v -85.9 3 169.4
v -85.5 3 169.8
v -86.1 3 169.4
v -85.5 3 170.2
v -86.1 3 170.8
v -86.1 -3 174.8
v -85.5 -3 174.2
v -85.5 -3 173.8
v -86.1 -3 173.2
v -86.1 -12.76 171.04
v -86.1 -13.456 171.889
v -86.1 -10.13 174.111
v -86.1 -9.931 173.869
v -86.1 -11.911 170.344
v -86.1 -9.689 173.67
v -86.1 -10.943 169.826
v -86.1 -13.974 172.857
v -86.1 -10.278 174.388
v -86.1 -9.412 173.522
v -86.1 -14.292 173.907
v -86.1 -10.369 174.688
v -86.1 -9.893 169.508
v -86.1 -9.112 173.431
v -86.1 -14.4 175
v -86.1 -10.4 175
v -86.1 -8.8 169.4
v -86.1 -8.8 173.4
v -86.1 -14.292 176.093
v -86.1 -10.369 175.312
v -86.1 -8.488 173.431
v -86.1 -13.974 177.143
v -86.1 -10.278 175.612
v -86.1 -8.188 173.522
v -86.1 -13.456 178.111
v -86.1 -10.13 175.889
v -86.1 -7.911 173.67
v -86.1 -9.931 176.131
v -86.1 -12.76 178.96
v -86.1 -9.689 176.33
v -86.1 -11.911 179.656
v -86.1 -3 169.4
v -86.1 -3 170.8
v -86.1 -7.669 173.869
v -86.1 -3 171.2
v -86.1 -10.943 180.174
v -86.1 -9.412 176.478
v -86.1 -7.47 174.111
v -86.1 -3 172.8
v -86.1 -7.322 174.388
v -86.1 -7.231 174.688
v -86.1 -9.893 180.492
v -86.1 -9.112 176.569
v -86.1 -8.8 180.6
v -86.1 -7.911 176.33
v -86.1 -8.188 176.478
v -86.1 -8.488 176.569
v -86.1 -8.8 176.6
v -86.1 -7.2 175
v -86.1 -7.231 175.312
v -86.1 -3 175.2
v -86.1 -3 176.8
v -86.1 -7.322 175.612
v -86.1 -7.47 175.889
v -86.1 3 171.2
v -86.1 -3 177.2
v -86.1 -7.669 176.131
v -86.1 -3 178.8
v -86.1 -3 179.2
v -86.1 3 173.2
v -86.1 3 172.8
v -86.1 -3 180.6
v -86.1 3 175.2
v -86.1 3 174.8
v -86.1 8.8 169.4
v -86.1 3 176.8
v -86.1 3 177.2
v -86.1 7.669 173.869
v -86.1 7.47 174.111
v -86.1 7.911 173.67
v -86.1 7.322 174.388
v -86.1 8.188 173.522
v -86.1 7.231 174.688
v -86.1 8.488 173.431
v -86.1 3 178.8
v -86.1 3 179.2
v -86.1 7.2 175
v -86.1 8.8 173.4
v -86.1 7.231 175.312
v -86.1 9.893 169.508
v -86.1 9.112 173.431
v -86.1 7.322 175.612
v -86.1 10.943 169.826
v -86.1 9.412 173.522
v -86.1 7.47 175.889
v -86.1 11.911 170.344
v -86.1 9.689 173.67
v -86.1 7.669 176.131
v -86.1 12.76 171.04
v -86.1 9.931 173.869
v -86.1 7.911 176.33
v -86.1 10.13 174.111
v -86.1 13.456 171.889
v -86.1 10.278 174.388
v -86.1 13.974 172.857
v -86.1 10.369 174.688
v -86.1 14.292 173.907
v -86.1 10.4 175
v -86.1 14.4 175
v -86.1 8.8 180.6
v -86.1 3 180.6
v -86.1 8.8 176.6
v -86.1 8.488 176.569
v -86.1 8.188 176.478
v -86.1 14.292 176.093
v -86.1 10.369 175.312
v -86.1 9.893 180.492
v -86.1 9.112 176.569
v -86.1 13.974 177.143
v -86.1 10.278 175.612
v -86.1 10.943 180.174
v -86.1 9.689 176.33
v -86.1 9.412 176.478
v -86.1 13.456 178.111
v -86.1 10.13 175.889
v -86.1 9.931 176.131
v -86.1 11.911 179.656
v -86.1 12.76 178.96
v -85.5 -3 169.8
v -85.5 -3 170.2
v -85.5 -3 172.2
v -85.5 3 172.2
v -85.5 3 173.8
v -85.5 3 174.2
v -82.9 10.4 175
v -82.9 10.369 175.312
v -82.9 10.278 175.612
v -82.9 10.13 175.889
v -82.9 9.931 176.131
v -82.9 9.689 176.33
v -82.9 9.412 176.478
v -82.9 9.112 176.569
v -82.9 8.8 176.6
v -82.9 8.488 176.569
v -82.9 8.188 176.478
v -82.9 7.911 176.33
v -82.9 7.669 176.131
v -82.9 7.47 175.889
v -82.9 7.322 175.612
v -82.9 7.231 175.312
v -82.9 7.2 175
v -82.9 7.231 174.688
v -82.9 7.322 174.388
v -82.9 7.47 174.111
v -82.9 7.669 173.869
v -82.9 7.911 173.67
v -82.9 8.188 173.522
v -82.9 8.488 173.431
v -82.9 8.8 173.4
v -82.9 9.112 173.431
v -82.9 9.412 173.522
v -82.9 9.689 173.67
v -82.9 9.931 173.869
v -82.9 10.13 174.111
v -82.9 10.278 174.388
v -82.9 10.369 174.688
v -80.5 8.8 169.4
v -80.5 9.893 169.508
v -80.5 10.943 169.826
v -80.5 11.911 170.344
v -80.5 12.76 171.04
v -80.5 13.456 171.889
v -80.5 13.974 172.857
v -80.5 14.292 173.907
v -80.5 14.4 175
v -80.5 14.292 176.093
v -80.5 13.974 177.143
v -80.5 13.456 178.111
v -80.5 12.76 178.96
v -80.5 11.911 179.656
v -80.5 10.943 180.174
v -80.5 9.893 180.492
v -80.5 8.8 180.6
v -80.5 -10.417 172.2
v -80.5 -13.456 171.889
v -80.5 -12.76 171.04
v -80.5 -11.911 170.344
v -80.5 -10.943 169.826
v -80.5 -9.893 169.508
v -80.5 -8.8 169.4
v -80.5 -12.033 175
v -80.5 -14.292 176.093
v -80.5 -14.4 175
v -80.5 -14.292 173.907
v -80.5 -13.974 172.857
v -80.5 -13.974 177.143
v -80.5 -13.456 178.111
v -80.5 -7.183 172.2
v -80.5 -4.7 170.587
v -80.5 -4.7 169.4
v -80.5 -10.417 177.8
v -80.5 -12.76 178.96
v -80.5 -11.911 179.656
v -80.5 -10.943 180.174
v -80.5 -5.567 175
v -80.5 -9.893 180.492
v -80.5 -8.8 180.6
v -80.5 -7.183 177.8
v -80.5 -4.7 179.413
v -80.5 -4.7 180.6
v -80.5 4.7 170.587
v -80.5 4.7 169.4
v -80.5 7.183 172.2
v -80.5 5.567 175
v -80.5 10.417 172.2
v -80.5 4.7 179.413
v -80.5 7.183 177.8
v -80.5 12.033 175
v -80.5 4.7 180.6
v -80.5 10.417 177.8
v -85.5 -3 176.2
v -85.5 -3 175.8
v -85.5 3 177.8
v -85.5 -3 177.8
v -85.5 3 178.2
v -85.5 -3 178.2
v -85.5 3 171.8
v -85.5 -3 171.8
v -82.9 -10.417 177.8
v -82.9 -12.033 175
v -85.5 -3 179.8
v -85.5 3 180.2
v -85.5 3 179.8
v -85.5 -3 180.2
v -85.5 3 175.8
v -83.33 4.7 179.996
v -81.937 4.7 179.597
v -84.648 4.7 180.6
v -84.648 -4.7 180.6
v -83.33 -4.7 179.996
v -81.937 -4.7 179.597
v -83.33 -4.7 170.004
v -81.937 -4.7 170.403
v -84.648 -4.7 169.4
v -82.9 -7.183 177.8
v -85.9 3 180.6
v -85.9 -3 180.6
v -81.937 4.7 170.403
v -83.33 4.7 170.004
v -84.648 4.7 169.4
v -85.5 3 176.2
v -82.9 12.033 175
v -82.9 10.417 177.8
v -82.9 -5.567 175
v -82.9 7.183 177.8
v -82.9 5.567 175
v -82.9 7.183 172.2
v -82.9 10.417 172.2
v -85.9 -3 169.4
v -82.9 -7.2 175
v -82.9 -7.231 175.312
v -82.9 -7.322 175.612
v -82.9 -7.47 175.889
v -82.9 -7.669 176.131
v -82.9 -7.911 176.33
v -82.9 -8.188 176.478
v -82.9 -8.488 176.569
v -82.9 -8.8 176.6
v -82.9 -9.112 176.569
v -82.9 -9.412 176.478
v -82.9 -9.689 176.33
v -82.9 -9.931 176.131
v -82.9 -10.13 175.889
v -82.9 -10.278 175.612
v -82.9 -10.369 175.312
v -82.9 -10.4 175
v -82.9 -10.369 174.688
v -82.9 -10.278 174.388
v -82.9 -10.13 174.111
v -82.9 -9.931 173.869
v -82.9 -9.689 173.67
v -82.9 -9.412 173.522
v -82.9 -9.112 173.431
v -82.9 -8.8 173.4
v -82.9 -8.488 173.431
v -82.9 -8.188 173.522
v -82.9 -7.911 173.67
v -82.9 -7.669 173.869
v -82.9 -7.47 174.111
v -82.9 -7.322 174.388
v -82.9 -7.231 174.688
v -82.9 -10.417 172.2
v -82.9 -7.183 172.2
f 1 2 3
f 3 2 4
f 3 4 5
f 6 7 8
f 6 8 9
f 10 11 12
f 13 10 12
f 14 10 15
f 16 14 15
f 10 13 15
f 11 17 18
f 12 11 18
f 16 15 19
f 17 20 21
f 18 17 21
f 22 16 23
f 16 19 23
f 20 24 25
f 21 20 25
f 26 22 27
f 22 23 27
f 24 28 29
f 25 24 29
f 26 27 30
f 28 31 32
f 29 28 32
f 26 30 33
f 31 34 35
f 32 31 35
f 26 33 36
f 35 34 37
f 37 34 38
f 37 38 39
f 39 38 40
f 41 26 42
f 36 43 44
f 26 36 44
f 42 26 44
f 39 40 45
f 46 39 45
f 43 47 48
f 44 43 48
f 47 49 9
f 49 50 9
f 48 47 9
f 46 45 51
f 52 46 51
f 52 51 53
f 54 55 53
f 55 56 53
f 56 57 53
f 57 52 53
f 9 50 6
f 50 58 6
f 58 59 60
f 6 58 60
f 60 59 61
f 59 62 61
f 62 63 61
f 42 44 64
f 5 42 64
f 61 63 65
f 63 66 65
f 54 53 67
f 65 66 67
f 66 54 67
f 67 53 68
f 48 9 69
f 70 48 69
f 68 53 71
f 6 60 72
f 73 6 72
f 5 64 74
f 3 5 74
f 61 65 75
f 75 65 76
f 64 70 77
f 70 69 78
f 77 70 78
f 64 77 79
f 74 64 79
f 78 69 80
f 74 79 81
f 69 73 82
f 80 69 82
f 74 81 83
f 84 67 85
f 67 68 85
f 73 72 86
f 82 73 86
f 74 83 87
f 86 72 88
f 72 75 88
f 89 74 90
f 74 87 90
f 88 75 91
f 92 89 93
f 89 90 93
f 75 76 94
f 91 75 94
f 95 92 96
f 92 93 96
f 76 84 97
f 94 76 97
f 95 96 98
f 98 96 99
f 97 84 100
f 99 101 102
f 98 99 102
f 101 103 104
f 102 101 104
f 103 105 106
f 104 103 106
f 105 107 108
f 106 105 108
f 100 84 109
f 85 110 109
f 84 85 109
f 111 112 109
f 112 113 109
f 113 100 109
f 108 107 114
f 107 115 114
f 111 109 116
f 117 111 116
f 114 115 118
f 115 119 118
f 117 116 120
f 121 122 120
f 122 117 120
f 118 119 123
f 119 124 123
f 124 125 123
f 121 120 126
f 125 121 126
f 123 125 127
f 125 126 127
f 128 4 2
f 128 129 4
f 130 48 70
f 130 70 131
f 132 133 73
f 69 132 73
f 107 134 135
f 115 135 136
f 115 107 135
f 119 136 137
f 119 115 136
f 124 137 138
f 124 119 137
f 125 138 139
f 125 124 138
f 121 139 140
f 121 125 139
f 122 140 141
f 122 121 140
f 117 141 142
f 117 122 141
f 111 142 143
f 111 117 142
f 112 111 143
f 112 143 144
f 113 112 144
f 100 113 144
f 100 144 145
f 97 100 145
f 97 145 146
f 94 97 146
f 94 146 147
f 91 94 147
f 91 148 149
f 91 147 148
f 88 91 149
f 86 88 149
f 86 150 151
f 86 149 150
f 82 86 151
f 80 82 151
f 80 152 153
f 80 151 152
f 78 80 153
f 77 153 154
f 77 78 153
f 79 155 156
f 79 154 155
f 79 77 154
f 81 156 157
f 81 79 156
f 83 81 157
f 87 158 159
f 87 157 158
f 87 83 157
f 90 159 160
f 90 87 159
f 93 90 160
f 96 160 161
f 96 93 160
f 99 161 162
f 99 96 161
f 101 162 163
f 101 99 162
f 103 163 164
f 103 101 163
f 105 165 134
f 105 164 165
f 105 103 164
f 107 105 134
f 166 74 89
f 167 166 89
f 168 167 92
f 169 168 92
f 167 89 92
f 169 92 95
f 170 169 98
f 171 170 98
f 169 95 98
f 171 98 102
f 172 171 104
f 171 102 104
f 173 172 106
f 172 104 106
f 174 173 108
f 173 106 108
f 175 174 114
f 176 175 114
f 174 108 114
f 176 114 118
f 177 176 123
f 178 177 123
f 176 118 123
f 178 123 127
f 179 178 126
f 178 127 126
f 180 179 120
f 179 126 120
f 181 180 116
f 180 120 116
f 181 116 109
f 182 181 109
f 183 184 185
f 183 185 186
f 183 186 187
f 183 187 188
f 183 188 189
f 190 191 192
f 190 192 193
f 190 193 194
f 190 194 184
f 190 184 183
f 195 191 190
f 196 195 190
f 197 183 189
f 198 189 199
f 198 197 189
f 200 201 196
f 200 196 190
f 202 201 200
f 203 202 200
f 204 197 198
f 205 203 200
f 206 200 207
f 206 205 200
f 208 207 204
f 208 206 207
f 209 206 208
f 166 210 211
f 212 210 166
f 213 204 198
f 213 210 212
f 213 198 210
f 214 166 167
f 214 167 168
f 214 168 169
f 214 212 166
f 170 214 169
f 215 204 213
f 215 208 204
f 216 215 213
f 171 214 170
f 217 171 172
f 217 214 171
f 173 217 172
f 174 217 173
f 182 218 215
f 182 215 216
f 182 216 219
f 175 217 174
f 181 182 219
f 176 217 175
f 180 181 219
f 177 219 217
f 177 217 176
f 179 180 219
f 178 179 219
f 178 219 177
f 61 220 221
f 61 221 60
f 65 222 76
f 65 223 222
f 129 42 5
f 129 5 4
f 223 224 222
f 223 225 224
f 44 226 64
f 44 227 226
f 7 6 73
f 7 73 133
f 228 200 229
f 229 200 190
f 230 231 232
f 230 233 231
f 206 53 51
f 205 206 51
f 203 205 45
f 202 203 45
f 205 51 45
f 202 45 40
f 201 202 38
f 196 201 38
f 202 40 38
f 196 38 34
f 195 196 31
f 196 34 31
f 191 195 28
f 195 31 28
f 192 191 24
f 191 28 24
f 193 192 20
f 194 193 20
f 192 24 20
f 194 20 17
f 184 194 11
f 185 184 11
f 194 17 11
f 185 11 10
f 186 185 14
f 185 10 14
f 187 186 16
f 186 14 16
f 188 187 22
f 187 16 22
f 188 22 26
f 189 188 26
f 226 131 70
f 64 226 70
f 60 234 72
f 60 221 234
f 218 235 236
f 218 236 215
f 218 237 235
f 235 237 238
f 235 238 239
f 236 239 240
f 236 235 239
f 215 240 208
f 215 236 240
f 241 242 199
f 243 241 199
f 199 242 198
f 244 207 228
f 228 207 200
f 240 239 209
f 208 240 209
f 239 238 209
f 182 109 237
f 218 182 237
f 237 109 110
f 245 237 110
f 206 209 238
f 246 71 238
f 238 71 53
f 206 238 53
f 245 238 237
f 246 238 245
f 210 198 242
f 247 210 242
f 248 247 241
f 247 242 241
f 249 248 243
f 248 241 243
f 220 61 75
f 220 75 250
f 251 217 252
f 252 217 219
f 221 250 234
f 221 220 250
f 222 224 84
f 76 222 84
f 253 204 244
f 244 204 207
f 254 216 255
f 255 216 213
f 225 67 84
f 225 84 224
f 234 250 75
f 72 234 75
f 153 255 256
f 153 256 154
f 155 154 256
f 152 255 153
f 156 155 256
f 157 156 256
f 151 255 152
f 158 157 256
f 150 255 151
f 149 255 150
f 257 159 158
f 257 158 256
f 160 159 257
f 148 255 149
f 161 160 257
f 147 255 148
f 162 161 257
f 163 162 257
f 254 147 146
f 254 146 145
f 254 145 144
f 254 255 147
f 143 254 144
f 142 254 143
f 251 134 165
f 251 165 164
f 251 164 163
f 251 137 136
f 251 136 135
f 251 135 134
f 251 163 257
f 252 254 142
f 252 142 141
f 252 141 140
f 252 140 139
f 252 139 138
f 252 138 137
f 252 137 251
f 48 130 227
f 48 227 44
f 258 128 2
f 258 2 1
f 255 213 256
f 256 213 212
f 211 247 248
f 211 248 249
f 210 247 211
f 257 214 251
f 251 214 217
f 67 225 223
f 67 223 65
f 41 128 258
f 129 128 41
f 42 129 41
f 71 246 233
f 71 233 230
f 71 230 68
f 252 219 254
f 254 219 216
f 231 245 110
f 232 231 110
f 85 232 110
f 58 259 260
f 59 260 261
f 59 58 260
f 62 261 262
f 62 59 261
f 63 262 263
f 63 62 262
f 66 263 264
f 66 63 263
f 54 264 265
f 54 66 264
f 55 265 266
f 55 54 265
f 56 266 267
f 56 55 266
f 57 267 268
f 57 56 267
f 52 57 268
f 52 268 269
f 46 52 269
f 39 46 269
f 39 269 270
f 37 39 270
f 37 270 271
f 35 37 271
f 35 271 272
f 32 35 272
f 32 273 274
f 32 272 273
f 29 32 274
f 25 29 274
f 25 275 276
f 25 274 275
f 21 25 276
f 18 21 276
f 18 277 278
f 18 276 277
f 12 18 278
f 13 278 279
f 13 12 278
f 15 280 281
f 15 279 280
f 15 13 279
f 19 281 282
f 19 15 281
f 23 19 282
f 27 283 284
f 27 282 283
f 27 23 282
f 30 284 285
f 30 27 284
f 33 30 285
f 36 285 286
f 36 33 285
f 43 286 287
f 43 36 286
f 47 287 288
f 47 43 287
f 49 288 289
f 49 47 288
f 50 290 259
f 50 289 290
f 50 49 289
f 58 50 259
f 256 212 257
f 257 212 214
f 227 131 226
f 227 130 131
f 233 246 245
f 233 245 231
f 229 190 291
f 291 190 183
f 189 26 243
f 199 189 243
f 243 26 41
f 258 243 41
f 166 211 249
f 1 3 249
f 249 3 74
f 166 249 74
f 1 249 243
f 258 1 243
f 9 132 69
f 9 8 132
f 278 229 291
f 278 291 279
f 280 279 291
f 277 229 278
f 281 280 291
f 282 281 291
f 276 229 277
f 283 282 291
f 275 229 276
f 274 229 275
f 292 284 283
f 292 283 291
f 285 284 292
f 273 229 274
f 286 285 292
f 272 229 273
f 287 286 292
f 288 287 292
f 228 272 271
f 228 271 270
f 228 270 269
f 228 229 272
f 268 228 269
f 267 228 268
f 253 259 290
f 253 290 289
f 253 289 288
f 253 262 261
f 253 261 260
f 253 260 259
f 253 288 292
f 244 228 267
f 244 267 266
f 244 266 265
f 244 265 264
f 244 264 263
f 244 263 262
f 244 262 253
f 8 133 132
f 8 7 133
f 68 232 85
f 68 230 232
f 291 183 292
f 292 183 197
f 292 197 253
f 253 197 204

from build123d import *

# Parameters (mm, degrees)
SKETCH019_R         = 1.6
PAD007_DEPTH        = 5.6
POCKET007_DEPTH     = 2.4
POCKET008_DEPTH     = 4.7
POCKET009_DEPTH     = 3
LINEARPATTERN_COUNT = 6
LINEARPATTERN_PITCH = 2


with BuildPart() as part:
    # Sketch019 (on Face6 of Binder001) → Pad007 (new body)
    with BuildSketch(Plane.YZ.offset(-86.1)):
        with BuildLine():
            Line((8.8, 180.6), (-8.8, 180.6))
            ThreePointArc((-8.8, 180.6), (-14.4, 175), (-8.8, 169.4))
            Line((-8.8, 169.4), (8.8, 169.4))
            ThreePointArc((8.8, 169.4), (14.4, 175), (8.8, 180.6))
        make_face()
        with Locations((-8.8, 175)):
            Circle(SKETCH019_R, mode=Mode.SUBTRACT)
        with Locations((8.8, 175)):
            Circle(SKETCH019_R, mode=Mode.SUBTRACT)
    extrude(amount=PAD007_DEPTH)

    # Sketch020 (on Face8 of Pad007) → Pocket007 (cut)
    with BuildSketch(Plane.YZ.offset(-80.5)):
        Polygon((-5.566838, 175), (-7.183419, 177.8), (-10.416581, 177.8), (-12.033162, 175), (-10.416581, 172.2), (-7.183419, 172.2), align=None)
        Polygon((5.566838, 175), (7.183419, 172.2), (10.416581, 172.2), (12.033162, 175), (10.416581, 177.8), (7.183419, 177.8), align=None)
    extrude(amount=-POCKET007_DEPTH, mode=Mode.SUBTRACT)

    # Sketch021 → Pocket008 (cut, symmetric)
    with BuildSketch(Plane.XZ):
        with BuildLine():
            ThreePointArc((-86.9, 182.325421), (-83.976243, 180.26218), (-80.5, 179.41303))
            Line((-80.5, 182.325421), (-80.5, 179.41303))
            Line((-86.9, 182.325421), (-80.5, 182.325421))
        make_face()
        with BuildLine():
            ThreePointArc((-80.5, 170.58697), (-83.976243, 169.73782), (-86.9, 167.674579))
            Line((-86.9, 167.674579), (-80.5, 167.674579))
            Line((-80.5, 167.674579), (-80.5, 170.58697))
        make_face()
    extrude(amount=POCKET008_DEPTH, both=True, mode=Mode.SUBTRACT)

    # Sketch022 → Pocket009 (cut, symmetric)
    with BuildSketch(Plane.XZ):
        Polygon((-86.1, 180.8), (-85.5, 180.2), (-85.5, 179.8), (-86.1, 179.2), align=None)
    pocket009 = extrude(amount=POCKET009_DEPTH, both=True, mode=Mode.SUBTRACT)

    # LinearPattern: Pocket009 ×6
    with Locations(*[(0, 0, -i * LINEARPATTERN_PITCH) for i in range(1, LINEARPATTERN_COUNT)]):
        add(pocket009, mode=Mode.SUBTRACT)


solid = part.part
